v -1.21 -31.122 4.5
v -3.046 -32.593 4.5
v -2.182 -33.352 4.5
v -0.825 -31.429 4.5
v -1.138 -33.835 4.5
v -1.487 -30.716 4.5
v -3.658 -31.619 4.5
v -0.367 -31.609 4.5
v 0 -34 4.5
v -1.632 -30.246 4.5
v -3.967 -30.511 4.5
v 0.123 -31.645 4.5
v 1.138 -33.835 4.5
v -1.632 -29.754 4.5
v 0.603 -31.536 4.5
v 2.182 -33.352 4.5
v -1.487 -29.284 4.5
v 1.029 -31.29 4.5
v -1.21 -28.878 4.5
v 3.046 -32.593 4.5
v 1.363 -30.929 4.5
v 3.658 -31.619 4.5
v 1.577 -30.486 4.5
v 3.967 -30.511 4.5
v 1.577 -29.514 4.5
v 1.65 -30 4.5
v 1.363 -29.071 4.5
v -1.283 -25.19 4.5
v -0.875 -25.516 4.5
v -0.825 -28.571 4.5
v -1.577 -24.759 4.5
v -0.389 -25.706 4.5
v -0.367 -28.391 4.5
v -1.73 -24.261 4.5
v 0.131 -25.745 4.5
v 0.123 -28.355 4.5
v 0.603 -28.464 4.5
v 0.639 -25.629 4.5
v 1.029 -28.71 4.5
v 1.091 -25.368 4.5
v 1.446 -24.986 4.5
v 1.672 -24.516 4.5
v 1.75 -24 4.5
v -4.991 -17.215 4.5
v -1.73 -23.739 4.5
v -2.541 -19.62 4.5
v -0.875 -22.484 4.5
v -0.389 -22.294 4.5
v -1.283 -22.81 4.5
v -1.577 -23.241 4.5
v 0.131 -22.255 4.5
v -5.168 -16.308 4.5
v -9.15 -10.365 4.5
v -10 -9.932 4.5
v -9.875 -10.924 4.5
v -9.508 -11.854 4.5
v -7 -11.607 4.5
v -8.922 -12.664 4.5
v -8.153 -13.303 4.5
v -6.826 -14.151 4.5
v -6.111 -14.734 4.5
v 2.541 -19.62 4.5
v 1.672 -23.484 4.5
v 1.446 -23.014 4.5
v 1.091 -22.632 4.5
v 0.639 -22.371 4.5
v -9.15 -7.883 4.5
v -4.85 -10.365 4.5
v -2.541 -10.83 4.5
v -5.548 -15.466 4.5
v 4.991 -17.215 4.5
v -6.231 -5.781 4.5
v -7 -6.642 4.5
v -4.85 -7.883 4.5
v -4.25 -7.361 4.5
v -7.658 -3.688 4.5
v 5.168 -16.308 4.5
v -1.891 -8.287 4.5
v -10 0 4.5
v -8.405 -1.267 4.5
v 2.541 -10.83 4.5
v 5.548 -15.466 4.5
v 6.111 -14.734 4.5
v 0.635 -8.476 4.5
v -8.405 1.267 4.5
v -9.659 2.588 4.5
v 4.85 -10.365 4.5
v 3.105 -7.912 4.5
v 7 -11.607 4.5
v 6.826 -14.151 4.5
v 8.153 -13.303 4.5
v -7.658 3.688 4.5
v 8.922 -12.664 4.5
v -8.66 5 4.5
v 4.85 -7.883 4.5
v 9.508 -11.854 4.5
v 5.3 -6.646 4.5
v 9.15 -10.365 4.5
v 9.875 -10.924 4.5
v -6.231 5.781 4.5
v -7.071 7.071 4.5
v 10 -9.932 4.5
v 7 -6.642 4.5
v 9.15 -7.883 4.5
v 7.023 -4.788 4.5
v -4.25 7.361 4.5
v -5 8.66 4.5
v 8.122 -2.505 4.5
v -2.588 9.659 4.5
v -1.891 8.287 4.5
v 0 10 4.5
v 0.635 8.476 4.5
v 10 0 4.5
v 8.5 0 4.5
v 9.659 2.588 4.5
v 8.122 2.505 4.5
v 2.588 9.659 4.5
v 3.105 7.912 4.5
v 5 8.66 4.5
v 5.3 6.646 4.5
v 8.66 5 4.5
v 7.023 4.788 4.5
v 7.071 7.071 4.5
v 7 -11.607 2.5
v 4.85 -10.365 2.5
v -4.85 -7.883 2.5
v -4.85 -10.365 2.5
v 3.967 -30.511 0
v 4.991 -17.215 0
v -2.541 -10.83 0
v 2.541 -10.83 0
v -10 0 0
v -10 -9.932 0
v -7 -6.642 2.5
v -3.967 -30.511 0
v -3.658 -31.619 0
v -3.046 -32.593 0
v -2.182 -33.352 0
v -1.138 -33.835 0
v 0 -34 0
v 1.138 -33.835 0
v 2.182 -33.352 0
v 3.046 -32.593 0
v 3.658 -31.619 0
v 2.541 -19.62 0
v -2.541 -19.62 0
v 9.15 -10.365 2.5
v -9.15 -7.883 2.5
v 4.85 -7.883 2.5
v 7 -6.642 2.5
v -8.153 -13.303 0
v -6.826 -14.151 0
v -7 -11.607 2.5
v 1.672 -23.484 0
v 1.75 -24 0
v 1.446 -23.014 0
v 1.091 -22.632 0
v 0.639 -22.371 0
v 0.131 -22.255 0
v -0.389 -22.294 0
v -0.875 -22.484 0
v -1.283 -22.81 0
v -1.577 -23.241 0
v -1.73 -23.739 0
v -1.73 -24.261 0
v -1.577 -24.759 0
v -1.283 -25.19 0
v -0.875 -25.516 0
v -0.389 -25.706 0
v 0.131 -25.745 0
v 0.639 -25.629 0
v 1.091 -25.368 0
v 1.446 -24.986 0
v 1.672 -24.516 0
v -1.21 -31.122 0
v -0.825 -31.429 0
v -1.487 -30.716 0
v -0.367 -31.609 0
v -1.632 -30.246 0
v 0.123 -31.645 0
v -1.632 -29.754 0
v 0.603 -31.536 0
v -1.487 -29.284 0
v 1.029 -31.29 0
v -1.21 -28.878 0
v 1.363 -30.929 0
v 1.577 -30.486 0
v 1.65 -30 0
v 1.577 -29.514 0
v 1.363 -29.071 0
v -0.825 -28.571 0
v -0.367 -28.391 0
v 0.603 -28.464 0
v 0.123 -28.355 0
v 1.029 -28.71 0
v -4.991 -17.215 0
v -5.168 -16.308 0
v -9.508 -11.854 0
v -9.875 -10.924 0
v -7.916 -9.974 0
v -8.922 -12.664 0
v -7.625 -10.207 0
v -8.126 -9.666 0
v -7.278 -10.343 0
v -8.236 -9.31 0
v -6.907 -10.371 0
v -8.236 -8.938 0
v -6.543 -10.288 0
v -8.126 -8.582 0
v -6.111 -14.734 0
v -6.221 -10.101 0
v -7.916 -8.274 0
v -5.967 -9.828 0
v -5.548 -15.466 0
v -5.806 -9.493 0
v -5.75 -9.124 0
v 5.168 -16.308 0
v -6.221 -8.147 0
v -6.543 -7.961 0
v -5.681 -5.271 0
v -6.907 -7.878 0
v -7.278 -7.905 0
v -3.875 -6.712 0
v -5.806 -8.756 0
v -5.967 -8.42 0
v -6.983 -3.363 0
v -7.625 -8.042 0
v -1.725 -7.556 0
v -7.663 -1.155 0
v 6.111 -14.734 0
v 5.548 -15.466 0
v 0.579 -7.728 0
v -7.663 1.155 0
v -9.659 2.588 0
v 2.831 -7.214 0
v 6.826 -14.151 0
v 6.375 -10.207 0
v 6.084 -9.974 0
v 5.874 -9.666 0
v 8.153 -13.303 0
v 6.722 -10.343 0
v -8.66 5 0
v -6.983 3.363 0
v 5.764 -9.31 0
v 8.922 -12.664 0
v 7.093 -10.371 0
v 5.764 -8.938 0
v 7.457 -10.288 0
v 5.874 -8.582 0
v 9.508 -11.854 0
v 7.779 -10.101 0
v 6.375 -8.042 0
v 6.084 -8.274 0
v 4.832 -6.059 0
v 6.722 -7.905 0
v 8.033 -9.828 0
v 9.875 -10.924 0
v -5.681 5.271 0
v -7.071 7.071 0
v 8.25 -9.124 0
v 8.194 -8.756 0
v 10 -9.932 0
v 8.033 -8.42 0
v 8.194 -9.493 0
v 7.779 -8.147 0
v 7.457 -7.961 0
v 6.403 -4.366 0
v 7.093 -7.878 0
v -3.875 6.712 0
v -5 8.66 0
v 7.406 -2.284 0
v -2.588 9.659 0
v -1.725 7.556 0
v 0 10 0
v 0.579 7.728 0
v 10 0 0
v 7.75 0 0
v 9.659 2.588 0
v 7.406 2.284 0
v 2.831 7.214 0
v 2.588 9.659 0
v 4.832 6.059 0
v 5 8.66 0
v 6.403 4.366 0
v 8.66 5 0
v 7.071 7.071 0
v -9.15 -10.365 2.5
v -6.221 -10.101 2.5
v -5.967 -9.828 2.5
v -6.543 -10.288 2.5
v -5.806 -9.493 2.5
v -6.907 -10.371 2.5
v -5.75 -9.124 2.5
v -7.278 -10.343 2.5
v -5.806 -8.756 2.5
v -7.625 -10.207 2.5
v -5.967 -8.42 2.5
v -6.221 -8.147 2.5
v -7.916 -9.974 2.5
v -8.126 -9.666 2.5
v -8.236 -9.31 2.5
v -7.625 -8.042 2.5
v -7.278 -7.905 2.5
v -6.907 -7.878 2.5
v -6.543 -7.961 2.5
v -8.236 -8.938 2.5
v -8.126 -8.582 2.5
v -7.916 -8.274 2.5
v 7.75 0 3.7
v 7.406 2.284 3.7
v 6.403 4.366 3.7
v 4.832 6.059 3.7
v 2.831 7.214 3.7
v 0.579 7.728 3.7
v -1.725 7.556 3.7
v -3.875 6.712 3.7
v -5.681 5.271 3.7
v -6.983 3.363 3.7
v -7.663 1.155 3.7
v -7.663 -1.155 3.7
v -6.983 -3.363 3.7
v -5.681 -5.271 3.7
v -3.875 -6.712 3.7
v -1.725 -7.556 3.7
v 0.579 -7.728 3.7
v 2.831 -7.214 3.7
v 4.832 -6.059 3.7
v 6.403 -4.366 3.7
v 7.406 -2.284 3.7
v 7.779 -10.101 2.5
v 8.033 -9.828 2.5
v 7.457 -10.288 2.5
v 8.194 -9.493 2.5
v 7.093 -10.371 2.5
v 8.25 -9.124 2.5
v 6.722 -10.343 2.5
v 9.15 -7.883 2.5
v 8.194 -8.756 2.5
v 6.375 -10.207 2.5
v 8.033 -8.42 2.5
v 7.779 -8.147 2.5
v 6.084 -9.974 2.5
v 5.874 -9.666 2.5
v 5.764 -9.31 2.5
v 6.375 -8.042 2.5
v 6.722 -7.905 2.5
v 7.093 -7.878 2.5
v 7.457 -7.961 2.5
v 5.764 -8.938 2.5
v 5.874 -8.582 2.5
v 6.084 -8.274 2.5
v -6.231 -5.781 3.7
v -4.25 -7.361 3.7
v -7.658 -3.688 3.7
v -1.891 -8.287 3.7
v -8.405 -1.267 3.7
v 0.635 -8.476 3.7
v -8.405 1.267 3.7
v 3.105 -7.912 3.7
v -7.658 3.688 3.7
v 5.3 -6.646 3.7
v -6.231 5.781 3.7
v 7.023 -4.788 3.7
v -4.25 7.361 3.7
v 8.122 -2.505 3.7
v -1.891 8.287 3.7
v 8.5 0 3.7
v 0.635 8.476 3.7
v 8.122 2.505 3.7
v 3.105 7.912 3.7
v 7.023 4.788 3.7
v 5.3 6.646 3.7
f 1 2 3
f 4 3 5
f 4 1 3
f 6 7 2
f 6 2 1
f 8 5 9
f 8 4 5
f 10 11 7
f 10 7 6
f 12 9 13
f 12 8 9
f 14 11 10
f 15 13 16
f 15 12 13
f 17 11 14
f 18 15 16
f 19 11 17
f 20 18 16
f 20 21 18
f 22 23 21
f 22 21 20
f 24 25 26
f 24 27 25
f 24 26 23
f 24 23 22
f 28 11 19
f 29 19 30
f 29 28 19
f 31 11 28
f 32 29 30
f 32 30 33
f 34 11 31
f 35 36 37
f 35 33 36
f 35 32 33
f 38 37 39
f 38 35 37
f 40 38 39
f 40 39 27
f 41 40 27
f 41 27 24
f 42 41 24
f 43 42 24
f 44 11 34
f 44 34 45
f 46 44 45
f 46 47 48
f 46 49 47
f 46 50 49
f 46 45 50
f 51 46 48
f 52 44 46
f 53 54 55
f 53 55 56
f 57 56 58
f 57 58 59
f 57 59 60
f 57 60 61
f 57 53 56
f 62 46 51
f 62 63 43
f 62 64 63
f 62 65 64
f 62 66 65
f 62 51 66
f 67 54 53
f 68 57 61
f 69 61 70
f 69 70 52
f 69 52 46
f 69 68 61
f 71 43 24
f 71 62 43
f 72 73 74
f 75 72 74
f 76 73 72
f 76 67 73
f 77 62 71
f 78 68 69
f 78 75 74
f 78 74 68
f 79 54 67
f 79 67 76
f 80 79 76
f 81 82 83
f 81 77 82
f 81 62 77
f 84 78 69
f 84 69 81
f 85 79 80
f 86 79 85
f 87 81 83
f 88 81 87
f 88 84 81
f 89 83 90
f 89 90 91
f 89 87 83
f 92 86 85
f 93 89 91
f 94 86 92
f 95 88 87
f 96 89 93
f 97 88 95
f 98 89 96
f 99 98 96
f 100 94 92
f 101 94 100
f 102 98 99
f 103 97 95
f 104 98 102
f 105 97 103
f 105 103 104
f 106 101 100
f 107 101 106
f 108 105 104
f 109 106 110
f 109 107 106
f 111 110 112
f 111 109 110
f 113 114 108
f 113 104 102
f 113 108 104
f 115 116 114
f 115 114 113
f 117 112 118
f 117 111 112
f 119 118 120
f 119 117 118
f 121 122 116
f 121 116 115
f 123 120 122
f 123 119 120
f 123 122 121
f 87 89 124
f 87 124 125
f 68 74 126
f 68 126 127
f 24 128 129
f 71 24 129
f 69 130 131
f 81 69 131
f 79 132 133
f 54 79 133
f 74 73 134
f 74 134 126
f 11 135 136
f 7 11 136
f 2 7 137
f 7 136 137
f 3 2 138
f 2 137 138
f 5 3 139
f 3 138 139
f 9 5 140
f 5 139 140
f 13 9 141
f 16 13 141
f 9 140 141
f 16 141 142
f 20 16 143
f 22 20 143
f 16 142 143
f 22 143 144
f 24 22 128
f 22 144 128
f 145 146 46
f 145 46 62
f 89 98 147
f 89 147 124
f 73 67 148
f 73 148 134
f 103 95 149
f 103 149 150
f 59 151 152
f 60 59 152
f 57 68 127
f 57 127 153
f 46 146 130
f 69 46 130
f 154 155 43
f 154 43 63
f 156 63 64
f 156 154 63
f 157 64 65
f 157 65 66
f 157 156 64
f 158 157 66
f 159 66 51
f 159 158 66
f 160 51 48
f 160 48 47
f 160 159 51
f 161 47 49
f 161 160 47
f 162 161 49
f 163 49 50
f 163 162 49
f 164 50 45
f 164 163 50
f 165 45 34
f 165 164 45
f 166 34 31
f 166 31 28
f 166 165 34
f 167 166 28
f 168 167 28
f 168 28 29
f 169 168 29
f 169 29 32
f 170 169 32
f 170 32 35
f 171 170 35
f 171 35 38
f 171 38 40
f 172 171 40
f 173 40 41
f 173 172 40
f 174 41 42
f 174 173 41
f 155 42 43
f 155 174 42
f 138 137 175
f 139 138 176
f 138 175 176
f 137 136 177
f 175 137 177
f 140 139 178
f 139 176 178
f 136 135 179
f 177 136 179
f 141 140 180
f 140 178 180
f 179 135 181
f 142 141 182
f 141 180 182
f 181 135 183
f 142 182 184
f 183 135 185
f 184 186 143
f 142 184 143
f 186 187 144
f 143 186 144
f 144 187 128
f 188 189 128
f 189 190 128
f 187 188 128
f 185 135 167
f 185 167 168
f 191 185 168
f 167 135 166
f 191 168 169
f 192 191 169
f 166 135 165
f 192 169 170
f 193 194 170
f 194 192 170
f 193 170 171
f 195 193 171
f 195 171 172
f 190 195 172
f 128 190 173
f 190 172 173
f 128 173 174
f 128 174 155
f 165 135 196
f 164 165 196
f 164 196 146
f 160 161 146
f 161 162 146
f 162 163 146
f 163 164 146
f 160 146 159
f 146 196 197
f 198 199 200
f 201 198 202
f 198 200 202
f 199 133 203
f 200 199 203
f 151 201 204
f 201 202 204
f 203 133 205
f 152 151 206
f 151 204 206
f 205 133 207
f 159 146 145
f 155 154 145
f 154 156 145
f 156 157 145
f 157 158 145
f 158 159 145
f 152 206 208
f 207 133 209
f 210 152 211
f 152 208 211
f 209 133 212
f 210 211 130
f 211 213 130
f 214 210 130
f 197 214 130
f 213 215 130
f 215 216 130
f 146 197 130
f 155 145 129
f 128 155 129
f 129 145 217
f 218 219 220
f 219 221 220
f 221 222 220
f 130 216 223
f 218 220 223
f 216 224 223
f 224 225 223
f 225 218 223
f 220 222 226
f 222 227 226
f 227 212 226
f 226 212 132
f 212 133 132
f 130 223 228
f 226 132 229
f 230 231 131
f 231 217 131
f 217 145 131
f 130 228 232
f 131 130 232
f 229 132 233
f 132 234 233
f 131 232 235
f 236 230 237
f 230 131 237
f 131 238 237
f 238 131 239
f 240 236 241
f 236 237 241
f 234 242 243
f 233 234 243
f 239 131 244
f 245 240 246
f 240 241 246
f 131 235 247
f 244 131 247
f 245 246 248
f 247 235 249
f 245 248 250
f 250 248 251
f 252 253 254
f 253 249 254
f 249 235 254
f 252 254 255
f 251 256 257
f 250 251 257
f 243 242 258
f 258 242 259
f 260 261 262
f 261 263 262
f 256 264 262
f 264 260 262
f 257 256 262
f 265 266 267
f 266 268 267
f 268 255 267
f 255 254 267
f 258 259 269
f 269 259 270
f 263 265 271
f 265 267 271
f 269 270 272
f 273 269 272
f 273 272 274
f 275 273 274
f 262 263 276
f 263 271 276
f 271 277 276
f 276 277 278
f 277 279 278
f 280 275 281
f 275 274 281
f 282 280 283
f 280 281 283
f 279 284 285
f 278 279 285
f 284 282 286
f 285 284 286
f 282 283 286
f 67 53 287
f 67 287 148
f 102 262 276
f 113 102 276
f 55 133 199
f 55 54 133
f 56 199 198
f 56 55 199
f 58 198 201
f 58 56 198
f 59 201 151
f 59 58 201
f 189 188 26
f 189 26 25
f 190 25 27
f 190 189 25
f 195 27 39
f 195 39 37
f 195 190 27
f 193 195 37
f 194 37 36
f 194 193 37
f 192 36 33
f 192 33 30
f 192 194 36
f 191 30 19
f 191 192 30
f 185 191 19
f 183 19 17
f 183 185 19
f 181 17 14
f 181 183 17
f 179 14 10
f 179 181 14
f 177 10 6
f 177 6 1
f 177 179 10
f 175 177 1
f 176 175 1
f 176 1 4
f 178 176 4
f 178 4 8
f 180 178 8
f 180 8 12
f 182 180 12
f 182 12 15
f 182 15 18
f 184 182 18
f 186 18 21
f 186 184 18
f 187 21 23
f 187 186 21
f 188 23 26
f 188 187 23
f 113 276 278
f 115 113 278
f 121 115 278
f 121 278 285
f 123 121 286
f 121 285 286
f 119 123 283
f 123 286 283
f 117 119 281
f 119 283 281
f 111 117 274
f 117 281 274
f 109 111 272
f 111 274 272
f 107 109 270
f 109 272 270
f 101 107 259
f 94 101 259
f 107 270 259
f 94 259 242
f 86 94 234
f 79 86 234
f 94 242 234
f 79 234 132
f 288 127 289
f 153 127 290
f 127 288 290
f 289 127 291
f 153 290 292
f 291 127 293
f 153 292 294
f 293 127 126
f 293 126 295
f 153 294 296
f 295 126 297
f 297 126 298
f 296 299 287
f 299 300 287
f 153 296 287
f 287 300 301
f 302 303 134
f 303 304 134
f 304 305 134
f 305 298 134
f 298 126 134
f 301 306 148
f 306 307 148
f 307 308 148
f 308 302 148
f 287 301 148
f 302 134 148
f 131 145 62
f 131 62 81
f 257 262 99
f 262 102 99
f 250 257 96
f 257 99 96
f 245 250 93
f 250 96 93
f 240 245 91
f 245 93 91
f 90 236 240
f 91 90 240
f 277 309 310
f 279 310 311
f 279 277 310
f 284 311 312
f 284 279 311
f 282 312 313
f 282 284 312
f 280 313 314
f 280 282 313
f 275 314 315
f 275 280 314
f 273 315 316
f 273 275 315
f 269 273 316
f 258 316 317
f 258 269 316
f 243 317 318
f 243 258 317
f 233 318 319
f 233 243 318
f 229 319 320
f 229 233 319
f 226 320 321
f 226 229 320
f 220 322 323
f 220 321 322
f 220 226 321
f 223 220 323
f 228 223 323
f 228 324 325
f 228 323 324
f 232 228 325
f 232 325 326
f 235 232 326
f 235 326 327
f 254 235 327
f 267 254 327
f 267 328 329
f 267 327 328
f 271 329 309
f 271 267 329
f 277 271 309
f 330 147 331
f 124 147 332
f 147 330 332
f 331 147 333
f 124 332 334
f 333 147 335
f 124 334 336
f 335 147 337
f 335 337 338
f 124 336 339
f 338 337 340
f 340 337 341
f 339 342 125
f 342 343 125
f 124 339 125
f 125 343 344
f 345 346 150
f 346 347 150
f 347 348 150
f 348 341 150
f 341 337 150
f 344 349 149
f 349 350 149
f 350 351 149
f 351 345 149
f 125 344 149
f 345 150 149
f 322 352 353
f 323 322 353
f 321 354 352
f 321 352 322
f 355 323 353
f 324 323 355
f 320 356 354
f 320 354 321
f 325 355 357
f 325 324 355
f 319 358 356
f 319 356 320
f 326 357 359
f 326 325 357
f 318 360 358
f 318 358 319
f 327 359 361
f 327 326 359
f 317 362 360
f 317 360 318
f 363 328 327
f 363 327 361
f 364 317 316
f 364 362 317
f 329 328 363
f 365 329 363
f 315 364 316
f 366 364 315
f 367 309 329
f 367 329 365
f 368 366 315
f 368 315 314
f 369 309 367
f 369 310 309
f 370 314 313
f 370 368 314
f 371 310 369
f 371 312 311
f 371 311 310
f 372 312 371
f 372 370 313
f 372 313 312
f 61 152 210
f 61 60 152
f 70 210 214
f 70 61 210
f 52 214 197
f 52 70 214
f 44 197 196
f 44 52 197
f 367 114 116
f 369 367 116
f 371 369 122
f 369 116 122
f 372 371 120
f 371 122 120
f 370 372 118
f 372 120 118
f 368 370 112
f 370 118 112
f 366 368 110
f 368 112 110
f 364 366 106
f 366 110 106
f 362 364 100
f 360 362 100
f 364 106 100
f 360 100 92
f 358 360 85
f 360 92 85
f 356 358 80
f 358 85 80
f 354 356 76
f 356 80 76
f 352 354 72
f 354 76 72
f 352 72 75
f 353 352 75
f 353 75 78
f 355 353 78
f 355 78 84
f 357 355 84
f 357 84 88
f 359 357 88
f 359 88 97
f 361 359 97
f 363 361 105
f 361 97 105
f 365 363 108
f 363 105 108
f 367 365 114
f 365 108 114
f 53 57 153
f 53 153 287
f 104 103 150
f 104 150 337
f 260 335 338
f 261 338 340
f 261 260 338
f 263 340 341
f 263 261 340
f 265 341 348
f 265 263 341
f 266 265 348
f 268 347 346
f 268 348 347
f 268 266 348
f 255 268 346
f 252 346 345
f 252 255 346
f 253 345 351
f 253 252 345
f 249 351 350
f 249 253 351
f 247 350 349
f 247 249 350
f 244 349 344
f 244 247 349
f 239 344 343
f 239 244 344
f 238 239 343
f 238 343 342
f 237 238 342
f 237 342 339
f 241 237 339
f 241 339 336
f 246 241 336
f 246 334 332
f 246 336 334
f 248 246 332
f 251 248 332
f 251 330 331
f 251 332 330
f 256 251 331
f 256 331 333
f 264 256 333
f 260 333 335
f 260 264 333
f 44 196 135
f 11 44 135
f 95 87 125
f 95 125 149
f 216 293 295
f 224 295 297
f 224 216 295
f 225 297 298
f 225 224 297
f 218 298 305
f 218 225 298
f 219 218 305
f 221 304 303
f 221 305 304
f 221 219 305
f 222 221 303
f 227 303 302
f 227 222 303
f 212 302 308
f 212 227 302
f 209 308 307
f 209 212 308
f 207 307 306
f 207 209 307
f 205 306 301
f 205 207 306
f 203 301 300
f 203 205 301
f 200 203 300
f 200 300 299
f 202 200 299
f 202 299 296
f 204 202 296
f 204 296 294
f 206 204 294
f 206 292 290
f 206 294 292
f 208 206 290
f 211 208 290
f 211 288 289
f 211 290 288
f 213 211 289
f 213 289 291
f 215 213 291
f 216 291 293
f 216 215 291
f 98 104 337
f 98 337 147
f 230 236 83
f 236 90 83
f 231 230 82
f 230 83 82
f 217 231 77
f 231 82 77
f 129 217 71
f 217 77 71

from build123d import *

# Parameters (mm, degrees)
SKETCH_1_R          = 7.75
SKETCH_1_R_2        = 1.25
SKETCH_1_R_3        = 1.65
SKETCH_1_R_4        = 1.75
SKETCH_1_W          = 5.081480492
SKETCH_1_H          = 8.790007362
EXTRUDE_1_DEPTH     = 4.5
SKETCH_2_R          = 8.5
CUT_EXTRUDE_1_DEPTH = 0.8
FILLET_1_R          = 4
CUT_EXTRUDE_2_DEPTH = 2


with BuildPart() as part:
    # 草图1 → 凸台-拉伸1 (new body)
    with BuildSketch(Plane.XY):
        with BuildLine():
            Line((-10, 0), (-10, -12.123829059))
            Line((-10, -12.123829059), (-5.144235045, -15.224714909))
            Line((-5.144235045, -15.224714909), (-3.96721445, -30.511086595))
            ThreePointArc((-3.96721445, -30.511086595), (0, -34), (3.96721445, -30.511086595))
            Line((3.96721445, -30.511086595), (5.144235045, -15.224714909))
            Line((5.144235045, -15.224714909), (10, -12.123829059))
            Line((10, -12.123829059), (10, 0))
            ThreePointArc((10, 0), (0, 10), (-10, 0))
        make_face()
        Circle(SKETCH_1_R, mode=Mode.SUBTRACT)
        with Locations((-7, -9.124143795)):
            Circle(SKETCH_1_R_2, mode=Mode.SUBTRACT)
        with Locations((7, -9.124143795)):
            Circle(SKETCH_1_R_2, mode=Mode.SUBTRACT)
        with Locations((0, -30)):
            Circle(SKETCH_1_R_3, mode=Mode.SUBTRACT)
        with Locations((0, -24)):
            Circle(SKETCH_1_R_4, mode=Mode.SUBTRACT)
        with Locations((0, -15.224714909)):
            Rectangle(SKETCH_1_W, SKETCH_1_H, mode=Mode.SUBTRACT)
    extrude(amount=EXTRUDE_1_DEPTH)

    # 草图2 → 切除-拉伸1 (cut)
    with BuildSketch(Plane.XY.offset(4.5)):
        Circle(SKETCH_2_R)
    extrude(amount=-CUT_EXTRUDE_1_DEPTH, mode=Mode.SUBTRACT)

    # 圆角1
    fillet_1_edges = [part.edges().sort_by_distance(p)[0] for p in [
        (-5.144235045, -15.224714909, 2.25),
        (-10, -12.123829059, 2.25),
        (10, -12.123829059, 2.25),
        (5.144235045, -15.224714909, 2.25),
    ]]
    fillet(fillet_1_edges, radius=FILLET_1_R)

    # 草图3 → 切除-拉伸2 (cut)
    with BuildSketch(Plane.XY.offset(4.5)):
        Polygon((7, -6.641537638), (9.15, -7.882840717), (9.15, -10.365446874), (7, -11.606749953), (4.85, -10.365446874), (4.85, -7.882840717), align=None)
        Polygon((-7, -6.641537638), (-4.85, -7.882840717), (-4.85, -10.365446874), (-7, -11.606749953), (-9.15, -10.365446874), (-9.15, -7.882840717), align=None)
    extrude(amount=-CUT_EXTRUDE_2_DEPTH, mode=Mode.SUBTRACT)


solid = part.part
